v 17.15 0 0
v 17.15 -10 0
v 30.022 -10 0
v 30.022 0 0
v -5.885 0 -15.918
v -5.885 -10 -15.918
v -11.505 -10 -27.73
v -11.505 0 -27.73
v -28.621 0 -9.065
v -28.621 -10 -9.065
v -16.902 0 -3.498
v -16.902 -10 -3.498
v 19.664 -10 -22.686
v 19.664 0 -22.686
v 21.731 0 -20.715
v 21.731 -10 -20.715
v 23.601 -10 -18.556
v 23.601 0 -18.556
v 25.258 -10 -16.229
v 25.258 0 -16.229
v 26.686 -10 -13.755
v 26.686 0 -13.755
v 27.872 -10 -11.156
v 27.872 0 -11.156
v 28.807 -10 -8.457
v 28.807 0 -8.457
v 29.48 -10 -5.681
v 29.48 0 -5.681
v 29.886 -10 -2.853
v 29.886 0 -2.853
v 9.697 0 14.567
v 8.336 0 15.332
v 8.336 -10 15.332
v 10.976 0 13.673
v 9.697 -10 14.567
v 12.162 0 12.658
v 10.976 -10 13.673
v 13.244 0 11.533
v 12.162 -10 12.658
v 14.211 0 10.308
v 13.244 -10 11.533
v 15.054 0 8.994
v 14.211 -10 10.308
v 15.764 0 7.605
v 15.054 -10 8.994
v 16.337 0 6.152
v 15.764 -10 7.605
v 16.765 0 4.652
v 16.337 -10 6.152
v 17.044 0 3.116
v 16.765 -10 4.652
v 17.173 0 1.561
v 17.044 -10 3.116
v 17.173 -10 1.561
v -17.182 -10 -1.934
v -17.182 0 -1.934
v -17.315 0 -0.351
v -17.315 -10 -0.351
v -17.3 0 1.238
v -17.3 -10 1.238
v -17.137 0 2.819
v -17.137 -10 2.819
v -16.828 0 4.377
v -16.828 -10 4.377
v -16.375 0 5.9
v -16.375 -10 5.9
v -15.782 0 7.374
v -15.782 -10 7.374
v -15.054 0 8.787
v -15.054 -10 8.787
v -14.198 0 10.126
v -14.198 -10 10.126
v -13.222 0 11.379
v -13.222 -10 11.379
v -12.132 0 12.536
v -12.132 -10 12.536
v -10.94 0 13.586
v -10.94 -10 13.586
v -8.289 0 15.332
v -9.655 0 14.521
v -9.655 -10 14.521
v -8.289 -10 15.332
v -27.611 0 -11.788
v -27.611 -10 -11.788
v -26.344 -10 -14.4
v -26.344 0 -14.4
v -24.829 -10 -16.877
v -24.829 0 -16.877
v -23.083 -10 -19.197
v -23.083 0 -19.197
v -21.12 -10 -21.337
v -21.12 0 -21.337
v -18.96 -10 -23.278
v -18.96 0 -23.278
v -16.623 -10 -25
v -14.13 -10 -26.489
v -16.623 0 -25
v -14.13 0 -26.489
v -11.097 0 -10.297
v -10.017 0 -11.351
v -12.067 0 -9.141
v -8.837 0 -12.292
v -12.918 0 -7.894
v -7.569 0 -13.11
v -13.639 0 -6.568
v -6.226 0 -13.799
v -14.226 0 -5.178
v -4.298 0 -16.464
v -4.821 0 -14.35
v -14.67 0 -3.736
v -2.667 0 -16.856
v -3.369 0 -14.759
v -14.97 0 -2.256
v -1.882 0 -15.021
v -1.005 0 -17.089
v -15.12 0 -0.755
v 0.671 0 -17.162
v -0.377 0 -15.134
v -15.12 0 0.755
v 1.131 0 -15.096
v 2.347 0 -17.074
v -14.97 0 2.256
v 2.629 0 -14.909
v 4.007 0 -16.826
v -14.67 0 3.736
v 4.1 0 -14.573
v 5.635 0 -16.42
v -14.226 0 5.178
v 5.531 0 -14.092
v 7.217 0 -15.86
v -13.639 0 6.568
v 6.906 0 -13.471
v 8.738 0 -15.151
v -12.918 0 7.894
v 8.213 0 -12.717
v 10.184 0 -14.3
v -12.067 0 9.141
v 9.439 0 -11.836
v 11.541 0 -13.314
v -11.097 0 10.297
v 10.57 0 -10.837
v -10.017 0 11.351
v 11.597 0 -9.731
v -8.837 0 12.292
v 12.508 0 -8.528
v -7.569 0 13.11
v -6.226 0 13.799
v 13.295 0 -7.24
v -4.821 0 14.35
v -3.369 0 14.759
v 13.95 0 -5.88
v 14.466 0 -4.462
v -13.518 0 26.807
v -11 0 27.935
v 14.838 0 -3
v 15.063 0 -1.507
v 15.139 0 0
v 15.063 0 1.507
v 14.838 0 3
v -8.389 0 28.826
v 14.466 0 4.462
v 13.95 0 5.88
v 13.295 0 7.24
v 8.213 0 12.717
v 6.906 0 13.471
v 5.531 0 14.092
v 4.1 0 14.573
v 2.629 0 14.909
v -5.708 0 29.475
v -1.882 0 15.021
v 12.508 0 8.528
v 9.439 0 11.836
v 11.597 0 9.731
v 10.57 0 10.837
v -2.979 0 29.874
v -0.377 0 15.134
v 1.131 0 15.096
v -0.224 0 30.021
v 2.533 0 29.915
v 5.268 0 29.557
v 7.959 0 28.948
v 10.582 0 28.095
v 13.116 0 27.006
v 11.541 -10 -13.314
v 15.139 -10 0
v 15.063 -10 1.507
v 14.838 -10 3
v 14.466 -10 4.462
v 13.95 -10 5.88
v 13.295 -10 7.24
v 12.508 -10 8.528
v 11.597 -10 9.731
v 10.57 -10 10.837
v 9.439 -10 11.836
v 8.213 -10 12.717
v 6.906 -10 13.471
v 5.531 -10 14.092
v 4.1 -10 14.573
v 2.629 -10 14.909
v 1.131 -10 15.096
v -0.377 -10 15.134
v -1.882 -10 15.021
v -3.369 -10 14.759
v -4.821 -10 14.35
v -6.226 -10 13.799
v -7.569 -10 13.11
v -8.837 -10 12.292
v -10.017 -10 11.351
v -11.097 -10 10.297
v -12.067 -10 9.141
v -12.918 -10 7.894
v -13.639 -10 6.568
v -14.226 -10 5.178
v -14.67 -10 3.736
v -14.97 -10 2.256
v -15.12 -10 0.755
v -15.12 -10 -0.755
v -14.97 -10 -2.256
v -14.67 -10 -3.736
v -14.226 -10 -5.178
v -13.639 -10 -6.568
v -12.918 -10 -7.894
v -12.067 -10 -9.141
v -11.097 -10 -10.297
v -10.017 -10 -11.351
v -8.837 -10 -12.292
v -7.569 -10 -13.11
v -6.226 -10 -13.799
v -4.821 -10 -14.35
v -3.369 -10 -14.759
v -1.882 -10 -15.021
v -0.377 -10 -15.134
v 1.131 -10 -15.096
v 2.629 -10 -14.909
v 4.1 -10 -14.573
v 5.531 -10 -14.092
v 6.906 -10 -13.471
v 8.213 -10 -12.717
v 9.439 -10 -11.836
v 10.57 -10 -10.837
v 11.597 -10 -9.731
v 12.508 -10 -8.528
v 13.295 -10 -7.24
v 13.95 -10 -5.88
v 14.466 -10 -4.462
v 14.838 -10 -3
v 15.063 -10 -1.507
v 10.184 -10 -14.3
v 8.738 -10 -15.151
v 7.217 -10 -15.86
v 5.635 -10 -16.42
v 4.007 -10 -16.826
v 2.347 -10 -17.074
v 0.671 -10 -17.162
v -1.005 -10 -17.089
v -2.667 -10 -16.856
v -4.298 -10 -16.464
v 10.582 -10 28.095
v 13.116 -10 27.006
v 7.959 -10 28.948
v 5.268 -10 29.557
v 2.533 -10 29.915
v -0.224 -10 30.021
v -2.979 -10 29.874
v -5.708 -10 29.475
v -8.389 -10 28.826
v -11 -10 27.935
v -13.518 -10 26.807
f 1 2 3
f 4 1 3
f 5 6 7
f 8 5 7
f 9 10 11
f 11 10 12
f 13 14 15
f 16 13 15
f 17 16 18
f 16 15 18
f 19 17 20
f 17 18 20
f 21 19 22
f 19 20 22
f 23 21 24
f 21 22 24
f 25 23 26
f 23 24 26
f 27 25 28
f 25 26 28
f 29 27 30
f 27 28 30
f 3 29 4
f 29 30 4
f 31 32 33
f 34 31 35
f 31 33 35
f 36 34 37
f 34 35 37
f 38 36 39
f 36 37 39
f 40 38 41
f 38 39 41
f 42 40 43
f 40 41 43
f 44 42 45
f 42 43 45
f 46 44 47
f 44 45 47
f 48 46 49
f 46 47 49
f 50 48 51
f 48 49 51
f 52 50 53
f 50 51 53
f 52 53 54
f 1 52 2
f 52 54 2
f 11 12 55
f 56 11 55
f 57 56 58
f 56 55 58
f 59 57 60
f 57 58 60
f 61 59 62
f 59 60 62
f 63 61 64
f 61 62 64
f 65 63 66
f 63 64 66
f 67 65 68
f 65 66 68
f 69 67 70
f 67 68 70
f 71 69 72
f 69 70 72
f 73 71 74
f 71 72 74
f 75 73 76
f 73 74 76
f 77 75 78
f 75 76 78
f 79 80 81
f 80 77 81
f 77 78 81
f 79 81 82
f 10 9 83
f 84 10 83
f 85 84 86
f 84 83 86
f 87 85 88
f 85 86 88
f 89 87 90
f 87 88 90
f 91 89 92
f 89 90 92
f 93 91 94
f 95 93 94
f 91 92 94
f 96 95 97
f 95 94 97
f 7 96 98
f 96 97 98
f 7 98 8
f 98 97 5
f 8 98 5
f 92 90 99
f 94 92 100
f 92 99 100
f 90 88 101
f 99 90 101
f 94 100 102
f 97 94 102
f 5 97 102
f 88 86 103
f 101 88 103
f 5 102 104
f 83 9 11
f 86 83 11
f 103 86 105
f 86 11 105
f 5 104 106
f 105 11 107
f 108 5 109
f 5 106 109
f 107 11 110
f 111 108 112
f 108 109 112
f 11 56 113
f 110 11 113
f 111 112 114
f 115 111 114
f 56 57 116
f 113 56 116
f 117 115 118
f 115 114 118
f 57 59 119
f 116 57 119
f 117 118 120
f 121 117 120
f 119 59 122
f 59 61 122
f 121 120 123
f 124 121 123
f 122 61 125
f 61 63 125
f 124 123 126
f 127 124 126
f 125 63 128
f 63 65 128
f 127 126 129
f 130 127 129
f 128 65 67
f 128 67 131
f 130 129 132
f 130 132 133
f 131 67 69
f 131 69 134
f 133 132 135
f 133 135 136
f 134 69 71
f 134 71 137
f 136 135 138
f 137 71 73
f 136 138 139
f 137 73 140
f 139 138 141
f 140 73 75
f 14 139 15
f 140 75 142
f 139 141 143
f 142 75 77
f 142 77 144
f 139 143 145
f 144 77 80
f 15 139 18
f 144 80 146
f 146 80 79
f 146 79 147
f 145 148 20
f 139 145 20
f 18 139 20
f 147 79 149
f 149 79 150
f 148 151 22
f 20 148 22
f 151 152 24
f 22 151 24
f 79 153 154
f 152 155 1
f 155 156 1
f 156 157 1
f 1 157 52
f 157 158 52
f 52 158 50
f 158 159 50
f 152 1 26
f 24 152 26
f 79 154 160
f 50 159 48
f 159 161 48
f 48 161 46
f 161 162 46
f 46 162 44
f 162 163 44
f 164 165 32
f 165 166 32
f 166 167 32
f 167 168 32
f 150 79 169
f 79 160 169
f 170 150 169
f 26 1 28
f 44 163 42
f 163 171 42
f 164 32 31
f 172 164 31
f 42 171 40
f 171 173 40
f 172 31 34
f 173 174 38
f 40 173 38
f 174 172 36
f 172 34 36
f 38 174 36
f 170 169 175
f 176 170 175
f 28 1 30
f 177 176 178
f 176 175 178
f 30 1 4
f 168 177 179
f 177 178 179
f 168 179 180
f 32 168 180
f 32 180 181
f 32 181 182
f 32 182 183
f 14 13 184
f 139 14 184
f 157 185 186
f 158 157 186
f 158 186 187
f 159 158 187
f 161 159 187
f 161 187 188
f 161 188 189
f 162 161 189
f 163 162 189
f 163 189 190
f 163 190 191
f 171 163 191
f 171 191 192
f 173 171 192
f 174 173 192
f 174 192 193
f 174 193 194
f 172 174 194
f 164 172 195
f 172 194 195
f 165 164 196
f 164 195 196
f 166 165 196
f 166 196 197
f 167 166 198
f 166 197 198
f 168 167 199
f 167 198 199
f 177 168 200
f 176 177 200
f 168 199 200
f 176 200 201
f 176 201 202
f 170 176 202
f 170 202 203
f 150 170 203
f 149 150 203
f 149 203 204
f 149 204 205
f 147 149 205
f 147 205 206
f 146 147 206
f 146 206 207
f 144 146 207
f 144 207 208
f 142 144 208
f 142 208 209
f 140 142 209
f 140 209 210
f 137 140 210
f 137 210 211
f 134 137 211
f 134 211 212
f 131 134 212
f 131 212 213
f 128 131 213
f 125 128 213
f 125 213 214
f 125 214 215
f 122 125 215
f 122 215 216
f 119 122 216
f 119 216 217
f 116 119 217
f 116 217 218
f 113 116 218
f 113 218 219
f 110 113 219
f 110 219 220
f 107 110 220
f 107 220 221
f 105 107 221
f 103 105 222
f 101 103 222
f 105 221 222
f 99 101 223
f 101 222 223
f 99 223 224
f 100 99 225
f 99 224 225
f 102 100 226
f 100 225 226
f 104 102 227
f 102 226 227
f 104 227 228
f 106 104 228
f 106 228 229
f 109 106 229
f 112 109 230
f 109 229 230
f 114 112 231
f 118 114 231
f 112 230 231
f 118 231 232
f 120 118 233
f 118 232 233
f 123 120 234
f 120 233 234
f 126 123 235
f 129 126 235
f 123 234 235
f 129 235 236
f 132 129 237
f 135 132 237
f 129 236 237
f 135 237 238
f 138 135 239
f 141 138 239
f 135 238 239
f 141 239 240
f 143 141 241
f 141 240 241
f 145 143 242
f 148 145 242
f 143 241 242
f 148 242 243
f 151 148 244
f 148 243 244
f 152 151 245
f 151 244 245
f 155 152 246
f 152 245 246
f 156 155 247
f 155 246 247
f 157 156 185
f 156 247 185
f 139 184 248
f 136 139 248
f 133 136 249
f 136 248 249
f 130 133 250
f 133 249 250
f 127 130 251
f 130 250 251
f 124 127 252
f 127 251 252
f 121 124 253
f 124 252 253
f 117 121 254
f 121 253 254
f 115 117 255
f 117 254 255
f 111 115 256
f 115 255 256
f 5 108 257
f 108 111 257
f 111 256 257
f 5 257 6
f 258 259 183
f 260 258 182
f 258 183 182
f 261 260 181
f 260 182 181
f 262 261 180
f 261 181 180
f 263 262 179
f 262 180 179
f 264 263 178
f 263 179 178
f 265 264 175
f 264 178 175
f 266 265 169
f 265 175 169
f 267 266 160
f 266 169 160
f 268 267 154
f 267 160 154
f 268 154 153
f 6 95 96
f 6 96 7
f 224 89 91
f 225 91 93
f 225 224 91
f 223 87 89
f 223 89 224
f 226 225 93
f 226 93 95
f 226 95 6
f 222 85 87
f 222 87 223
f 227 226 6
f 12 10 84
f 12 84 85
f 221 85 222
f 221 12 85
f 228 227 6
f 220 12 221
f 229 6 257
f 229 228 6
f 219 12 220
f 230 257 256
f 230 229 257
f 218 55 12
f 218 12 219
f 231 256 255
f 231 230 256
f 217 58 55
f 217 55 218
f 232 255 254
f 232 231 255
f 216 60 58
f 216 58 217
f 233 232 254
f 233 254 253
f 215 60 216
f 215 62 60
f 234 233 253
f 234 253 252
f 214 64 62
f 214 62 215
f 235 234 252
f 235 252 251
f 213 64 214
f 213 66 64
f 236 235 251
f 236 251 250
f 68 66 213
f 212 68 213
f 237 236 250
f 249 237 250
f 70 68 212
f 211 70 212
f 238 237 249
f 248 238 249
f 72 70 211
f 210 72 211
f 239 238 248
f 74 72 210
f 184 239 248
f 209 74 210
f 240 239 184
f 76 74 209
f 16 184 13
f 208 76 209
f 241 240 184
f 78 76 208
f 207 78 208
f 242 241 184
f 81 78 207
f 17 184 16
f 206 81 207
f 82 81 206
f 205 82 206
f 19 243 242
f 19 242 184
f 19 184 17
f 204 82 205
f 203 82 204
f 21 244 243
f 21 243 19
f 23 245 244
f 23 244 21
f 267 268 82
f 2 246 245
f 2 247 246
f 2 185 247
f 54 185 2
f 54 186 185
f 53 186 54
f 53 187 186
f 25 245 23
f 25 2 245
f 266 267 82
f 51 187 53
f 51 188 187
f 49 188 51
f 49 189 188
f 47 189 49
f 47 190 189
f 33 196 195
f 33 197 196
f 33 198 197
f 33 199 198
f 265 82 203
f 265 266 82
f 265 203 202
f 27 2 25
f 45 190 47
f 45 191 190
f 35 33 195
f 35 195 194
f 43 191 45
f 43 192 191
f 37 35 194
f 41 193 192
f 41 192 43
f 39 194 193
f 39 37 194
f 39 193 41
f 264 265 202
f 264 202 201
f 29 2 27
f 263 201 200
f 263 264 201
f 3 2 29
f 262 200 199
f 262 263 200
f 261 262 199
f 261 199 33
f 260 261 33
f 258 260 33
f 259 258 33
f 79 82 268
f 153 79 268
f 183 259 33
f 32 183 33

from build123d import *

# Parameters (mm, degrees)
F0_R     = 30.022303
F1_DEPTH = 10
F3_DEPTH = 25
F4_R     = 15.13861
F5_DEPTH = 25


with BuildPart() as f1:
    # F0 (on Front) → F1 (new body)
    with BuildSketch(Plane.XZ):
        Circle(F0_R)
    extrude(amount=F1_DEPTH)

    # F2 (on face) → F3 (cut)
    with BuildSketch(Plane.XZ.offset(10)):
        with BuildLine():
            ThreePointArc((-13.51767, 26.806926), (-0.223887, 30.021468), (13.11636, 27.005551))
            ThreePointArc((13.11636, 27.005551), (-0.226298, 30.344822), (-13.51767, 26.806926))
        make_face()
        with BuildLine():
            ThreePointArc((19.663822, -22.686401), (27.429863, -12.524318), (30.022303, 0))
            ThreePointArc((30.022303, 0), (27.31018, -12.469672), (19.663822, -22.686401))
        make_face()
        with BuildLine():
            ThreePointArc((-11.50515, -27.730312), (-22.127404, -20.290802), (-28.62096, -9.065281))
            ThreePointArc((-28.62096, -9.065281), (-22.573017, -20.699429), (-11.50515, -27.730312))
        make_face()
        with BuildLine():
            Line((-8.288842, 15.331867), (-13.51767, 26.806926))
            ThreePointArc((-13.51767, 26.806926), (-27.669836, 11.649842), (-28.62096, -9.065281))
            Line((-28.62096, -9.065281), (-16.901936, -3.498297))
            ThreePointArc((-16.901936, -3.498297), (-15.781932, 7.37434), (-8.288842, 15.331867))
        make_face()
        with BuildLine():
            ThreePointArc((-11.50515, -27.730312), (4.795961, -29.636758), (19.663822, -22.686401))
            Line((19.663822, -22.686401), (11.541307, -13.314021))
            ThreePointArc((11.541307, -13.314021), (3.179849, -16.970197), (-5.885188, -15.918192))
            Line((-5.885188, -15.918192), (-11.50515, -27.730312))
        make_face()
        with BuildLine():
            ThreePointArc((30.022303, 0), (25.44722, 15.930401), (13.11636, 27.005551))
            Line((13.11636, 27.005551), (8.336435, 15.331867))
            ThreePointArc((8.336435, 15.331867), (15.053544, 8.994054), (17.149832, 0))
            Line((17.149832, 0), (30.022303, 0))
        make_face()
    extrude(amount=-F3_DEPTH, mode=Mode.SUBTRACT)

    # F4 (on face) → F5 (cut)
    with BuildSketch(Plane.XZ.offset(10)):
        Circle(F4_R)
    extrude(amount=-F5_DEPTH, mode=Mode.SUBTRACT)


solid = f1.part
